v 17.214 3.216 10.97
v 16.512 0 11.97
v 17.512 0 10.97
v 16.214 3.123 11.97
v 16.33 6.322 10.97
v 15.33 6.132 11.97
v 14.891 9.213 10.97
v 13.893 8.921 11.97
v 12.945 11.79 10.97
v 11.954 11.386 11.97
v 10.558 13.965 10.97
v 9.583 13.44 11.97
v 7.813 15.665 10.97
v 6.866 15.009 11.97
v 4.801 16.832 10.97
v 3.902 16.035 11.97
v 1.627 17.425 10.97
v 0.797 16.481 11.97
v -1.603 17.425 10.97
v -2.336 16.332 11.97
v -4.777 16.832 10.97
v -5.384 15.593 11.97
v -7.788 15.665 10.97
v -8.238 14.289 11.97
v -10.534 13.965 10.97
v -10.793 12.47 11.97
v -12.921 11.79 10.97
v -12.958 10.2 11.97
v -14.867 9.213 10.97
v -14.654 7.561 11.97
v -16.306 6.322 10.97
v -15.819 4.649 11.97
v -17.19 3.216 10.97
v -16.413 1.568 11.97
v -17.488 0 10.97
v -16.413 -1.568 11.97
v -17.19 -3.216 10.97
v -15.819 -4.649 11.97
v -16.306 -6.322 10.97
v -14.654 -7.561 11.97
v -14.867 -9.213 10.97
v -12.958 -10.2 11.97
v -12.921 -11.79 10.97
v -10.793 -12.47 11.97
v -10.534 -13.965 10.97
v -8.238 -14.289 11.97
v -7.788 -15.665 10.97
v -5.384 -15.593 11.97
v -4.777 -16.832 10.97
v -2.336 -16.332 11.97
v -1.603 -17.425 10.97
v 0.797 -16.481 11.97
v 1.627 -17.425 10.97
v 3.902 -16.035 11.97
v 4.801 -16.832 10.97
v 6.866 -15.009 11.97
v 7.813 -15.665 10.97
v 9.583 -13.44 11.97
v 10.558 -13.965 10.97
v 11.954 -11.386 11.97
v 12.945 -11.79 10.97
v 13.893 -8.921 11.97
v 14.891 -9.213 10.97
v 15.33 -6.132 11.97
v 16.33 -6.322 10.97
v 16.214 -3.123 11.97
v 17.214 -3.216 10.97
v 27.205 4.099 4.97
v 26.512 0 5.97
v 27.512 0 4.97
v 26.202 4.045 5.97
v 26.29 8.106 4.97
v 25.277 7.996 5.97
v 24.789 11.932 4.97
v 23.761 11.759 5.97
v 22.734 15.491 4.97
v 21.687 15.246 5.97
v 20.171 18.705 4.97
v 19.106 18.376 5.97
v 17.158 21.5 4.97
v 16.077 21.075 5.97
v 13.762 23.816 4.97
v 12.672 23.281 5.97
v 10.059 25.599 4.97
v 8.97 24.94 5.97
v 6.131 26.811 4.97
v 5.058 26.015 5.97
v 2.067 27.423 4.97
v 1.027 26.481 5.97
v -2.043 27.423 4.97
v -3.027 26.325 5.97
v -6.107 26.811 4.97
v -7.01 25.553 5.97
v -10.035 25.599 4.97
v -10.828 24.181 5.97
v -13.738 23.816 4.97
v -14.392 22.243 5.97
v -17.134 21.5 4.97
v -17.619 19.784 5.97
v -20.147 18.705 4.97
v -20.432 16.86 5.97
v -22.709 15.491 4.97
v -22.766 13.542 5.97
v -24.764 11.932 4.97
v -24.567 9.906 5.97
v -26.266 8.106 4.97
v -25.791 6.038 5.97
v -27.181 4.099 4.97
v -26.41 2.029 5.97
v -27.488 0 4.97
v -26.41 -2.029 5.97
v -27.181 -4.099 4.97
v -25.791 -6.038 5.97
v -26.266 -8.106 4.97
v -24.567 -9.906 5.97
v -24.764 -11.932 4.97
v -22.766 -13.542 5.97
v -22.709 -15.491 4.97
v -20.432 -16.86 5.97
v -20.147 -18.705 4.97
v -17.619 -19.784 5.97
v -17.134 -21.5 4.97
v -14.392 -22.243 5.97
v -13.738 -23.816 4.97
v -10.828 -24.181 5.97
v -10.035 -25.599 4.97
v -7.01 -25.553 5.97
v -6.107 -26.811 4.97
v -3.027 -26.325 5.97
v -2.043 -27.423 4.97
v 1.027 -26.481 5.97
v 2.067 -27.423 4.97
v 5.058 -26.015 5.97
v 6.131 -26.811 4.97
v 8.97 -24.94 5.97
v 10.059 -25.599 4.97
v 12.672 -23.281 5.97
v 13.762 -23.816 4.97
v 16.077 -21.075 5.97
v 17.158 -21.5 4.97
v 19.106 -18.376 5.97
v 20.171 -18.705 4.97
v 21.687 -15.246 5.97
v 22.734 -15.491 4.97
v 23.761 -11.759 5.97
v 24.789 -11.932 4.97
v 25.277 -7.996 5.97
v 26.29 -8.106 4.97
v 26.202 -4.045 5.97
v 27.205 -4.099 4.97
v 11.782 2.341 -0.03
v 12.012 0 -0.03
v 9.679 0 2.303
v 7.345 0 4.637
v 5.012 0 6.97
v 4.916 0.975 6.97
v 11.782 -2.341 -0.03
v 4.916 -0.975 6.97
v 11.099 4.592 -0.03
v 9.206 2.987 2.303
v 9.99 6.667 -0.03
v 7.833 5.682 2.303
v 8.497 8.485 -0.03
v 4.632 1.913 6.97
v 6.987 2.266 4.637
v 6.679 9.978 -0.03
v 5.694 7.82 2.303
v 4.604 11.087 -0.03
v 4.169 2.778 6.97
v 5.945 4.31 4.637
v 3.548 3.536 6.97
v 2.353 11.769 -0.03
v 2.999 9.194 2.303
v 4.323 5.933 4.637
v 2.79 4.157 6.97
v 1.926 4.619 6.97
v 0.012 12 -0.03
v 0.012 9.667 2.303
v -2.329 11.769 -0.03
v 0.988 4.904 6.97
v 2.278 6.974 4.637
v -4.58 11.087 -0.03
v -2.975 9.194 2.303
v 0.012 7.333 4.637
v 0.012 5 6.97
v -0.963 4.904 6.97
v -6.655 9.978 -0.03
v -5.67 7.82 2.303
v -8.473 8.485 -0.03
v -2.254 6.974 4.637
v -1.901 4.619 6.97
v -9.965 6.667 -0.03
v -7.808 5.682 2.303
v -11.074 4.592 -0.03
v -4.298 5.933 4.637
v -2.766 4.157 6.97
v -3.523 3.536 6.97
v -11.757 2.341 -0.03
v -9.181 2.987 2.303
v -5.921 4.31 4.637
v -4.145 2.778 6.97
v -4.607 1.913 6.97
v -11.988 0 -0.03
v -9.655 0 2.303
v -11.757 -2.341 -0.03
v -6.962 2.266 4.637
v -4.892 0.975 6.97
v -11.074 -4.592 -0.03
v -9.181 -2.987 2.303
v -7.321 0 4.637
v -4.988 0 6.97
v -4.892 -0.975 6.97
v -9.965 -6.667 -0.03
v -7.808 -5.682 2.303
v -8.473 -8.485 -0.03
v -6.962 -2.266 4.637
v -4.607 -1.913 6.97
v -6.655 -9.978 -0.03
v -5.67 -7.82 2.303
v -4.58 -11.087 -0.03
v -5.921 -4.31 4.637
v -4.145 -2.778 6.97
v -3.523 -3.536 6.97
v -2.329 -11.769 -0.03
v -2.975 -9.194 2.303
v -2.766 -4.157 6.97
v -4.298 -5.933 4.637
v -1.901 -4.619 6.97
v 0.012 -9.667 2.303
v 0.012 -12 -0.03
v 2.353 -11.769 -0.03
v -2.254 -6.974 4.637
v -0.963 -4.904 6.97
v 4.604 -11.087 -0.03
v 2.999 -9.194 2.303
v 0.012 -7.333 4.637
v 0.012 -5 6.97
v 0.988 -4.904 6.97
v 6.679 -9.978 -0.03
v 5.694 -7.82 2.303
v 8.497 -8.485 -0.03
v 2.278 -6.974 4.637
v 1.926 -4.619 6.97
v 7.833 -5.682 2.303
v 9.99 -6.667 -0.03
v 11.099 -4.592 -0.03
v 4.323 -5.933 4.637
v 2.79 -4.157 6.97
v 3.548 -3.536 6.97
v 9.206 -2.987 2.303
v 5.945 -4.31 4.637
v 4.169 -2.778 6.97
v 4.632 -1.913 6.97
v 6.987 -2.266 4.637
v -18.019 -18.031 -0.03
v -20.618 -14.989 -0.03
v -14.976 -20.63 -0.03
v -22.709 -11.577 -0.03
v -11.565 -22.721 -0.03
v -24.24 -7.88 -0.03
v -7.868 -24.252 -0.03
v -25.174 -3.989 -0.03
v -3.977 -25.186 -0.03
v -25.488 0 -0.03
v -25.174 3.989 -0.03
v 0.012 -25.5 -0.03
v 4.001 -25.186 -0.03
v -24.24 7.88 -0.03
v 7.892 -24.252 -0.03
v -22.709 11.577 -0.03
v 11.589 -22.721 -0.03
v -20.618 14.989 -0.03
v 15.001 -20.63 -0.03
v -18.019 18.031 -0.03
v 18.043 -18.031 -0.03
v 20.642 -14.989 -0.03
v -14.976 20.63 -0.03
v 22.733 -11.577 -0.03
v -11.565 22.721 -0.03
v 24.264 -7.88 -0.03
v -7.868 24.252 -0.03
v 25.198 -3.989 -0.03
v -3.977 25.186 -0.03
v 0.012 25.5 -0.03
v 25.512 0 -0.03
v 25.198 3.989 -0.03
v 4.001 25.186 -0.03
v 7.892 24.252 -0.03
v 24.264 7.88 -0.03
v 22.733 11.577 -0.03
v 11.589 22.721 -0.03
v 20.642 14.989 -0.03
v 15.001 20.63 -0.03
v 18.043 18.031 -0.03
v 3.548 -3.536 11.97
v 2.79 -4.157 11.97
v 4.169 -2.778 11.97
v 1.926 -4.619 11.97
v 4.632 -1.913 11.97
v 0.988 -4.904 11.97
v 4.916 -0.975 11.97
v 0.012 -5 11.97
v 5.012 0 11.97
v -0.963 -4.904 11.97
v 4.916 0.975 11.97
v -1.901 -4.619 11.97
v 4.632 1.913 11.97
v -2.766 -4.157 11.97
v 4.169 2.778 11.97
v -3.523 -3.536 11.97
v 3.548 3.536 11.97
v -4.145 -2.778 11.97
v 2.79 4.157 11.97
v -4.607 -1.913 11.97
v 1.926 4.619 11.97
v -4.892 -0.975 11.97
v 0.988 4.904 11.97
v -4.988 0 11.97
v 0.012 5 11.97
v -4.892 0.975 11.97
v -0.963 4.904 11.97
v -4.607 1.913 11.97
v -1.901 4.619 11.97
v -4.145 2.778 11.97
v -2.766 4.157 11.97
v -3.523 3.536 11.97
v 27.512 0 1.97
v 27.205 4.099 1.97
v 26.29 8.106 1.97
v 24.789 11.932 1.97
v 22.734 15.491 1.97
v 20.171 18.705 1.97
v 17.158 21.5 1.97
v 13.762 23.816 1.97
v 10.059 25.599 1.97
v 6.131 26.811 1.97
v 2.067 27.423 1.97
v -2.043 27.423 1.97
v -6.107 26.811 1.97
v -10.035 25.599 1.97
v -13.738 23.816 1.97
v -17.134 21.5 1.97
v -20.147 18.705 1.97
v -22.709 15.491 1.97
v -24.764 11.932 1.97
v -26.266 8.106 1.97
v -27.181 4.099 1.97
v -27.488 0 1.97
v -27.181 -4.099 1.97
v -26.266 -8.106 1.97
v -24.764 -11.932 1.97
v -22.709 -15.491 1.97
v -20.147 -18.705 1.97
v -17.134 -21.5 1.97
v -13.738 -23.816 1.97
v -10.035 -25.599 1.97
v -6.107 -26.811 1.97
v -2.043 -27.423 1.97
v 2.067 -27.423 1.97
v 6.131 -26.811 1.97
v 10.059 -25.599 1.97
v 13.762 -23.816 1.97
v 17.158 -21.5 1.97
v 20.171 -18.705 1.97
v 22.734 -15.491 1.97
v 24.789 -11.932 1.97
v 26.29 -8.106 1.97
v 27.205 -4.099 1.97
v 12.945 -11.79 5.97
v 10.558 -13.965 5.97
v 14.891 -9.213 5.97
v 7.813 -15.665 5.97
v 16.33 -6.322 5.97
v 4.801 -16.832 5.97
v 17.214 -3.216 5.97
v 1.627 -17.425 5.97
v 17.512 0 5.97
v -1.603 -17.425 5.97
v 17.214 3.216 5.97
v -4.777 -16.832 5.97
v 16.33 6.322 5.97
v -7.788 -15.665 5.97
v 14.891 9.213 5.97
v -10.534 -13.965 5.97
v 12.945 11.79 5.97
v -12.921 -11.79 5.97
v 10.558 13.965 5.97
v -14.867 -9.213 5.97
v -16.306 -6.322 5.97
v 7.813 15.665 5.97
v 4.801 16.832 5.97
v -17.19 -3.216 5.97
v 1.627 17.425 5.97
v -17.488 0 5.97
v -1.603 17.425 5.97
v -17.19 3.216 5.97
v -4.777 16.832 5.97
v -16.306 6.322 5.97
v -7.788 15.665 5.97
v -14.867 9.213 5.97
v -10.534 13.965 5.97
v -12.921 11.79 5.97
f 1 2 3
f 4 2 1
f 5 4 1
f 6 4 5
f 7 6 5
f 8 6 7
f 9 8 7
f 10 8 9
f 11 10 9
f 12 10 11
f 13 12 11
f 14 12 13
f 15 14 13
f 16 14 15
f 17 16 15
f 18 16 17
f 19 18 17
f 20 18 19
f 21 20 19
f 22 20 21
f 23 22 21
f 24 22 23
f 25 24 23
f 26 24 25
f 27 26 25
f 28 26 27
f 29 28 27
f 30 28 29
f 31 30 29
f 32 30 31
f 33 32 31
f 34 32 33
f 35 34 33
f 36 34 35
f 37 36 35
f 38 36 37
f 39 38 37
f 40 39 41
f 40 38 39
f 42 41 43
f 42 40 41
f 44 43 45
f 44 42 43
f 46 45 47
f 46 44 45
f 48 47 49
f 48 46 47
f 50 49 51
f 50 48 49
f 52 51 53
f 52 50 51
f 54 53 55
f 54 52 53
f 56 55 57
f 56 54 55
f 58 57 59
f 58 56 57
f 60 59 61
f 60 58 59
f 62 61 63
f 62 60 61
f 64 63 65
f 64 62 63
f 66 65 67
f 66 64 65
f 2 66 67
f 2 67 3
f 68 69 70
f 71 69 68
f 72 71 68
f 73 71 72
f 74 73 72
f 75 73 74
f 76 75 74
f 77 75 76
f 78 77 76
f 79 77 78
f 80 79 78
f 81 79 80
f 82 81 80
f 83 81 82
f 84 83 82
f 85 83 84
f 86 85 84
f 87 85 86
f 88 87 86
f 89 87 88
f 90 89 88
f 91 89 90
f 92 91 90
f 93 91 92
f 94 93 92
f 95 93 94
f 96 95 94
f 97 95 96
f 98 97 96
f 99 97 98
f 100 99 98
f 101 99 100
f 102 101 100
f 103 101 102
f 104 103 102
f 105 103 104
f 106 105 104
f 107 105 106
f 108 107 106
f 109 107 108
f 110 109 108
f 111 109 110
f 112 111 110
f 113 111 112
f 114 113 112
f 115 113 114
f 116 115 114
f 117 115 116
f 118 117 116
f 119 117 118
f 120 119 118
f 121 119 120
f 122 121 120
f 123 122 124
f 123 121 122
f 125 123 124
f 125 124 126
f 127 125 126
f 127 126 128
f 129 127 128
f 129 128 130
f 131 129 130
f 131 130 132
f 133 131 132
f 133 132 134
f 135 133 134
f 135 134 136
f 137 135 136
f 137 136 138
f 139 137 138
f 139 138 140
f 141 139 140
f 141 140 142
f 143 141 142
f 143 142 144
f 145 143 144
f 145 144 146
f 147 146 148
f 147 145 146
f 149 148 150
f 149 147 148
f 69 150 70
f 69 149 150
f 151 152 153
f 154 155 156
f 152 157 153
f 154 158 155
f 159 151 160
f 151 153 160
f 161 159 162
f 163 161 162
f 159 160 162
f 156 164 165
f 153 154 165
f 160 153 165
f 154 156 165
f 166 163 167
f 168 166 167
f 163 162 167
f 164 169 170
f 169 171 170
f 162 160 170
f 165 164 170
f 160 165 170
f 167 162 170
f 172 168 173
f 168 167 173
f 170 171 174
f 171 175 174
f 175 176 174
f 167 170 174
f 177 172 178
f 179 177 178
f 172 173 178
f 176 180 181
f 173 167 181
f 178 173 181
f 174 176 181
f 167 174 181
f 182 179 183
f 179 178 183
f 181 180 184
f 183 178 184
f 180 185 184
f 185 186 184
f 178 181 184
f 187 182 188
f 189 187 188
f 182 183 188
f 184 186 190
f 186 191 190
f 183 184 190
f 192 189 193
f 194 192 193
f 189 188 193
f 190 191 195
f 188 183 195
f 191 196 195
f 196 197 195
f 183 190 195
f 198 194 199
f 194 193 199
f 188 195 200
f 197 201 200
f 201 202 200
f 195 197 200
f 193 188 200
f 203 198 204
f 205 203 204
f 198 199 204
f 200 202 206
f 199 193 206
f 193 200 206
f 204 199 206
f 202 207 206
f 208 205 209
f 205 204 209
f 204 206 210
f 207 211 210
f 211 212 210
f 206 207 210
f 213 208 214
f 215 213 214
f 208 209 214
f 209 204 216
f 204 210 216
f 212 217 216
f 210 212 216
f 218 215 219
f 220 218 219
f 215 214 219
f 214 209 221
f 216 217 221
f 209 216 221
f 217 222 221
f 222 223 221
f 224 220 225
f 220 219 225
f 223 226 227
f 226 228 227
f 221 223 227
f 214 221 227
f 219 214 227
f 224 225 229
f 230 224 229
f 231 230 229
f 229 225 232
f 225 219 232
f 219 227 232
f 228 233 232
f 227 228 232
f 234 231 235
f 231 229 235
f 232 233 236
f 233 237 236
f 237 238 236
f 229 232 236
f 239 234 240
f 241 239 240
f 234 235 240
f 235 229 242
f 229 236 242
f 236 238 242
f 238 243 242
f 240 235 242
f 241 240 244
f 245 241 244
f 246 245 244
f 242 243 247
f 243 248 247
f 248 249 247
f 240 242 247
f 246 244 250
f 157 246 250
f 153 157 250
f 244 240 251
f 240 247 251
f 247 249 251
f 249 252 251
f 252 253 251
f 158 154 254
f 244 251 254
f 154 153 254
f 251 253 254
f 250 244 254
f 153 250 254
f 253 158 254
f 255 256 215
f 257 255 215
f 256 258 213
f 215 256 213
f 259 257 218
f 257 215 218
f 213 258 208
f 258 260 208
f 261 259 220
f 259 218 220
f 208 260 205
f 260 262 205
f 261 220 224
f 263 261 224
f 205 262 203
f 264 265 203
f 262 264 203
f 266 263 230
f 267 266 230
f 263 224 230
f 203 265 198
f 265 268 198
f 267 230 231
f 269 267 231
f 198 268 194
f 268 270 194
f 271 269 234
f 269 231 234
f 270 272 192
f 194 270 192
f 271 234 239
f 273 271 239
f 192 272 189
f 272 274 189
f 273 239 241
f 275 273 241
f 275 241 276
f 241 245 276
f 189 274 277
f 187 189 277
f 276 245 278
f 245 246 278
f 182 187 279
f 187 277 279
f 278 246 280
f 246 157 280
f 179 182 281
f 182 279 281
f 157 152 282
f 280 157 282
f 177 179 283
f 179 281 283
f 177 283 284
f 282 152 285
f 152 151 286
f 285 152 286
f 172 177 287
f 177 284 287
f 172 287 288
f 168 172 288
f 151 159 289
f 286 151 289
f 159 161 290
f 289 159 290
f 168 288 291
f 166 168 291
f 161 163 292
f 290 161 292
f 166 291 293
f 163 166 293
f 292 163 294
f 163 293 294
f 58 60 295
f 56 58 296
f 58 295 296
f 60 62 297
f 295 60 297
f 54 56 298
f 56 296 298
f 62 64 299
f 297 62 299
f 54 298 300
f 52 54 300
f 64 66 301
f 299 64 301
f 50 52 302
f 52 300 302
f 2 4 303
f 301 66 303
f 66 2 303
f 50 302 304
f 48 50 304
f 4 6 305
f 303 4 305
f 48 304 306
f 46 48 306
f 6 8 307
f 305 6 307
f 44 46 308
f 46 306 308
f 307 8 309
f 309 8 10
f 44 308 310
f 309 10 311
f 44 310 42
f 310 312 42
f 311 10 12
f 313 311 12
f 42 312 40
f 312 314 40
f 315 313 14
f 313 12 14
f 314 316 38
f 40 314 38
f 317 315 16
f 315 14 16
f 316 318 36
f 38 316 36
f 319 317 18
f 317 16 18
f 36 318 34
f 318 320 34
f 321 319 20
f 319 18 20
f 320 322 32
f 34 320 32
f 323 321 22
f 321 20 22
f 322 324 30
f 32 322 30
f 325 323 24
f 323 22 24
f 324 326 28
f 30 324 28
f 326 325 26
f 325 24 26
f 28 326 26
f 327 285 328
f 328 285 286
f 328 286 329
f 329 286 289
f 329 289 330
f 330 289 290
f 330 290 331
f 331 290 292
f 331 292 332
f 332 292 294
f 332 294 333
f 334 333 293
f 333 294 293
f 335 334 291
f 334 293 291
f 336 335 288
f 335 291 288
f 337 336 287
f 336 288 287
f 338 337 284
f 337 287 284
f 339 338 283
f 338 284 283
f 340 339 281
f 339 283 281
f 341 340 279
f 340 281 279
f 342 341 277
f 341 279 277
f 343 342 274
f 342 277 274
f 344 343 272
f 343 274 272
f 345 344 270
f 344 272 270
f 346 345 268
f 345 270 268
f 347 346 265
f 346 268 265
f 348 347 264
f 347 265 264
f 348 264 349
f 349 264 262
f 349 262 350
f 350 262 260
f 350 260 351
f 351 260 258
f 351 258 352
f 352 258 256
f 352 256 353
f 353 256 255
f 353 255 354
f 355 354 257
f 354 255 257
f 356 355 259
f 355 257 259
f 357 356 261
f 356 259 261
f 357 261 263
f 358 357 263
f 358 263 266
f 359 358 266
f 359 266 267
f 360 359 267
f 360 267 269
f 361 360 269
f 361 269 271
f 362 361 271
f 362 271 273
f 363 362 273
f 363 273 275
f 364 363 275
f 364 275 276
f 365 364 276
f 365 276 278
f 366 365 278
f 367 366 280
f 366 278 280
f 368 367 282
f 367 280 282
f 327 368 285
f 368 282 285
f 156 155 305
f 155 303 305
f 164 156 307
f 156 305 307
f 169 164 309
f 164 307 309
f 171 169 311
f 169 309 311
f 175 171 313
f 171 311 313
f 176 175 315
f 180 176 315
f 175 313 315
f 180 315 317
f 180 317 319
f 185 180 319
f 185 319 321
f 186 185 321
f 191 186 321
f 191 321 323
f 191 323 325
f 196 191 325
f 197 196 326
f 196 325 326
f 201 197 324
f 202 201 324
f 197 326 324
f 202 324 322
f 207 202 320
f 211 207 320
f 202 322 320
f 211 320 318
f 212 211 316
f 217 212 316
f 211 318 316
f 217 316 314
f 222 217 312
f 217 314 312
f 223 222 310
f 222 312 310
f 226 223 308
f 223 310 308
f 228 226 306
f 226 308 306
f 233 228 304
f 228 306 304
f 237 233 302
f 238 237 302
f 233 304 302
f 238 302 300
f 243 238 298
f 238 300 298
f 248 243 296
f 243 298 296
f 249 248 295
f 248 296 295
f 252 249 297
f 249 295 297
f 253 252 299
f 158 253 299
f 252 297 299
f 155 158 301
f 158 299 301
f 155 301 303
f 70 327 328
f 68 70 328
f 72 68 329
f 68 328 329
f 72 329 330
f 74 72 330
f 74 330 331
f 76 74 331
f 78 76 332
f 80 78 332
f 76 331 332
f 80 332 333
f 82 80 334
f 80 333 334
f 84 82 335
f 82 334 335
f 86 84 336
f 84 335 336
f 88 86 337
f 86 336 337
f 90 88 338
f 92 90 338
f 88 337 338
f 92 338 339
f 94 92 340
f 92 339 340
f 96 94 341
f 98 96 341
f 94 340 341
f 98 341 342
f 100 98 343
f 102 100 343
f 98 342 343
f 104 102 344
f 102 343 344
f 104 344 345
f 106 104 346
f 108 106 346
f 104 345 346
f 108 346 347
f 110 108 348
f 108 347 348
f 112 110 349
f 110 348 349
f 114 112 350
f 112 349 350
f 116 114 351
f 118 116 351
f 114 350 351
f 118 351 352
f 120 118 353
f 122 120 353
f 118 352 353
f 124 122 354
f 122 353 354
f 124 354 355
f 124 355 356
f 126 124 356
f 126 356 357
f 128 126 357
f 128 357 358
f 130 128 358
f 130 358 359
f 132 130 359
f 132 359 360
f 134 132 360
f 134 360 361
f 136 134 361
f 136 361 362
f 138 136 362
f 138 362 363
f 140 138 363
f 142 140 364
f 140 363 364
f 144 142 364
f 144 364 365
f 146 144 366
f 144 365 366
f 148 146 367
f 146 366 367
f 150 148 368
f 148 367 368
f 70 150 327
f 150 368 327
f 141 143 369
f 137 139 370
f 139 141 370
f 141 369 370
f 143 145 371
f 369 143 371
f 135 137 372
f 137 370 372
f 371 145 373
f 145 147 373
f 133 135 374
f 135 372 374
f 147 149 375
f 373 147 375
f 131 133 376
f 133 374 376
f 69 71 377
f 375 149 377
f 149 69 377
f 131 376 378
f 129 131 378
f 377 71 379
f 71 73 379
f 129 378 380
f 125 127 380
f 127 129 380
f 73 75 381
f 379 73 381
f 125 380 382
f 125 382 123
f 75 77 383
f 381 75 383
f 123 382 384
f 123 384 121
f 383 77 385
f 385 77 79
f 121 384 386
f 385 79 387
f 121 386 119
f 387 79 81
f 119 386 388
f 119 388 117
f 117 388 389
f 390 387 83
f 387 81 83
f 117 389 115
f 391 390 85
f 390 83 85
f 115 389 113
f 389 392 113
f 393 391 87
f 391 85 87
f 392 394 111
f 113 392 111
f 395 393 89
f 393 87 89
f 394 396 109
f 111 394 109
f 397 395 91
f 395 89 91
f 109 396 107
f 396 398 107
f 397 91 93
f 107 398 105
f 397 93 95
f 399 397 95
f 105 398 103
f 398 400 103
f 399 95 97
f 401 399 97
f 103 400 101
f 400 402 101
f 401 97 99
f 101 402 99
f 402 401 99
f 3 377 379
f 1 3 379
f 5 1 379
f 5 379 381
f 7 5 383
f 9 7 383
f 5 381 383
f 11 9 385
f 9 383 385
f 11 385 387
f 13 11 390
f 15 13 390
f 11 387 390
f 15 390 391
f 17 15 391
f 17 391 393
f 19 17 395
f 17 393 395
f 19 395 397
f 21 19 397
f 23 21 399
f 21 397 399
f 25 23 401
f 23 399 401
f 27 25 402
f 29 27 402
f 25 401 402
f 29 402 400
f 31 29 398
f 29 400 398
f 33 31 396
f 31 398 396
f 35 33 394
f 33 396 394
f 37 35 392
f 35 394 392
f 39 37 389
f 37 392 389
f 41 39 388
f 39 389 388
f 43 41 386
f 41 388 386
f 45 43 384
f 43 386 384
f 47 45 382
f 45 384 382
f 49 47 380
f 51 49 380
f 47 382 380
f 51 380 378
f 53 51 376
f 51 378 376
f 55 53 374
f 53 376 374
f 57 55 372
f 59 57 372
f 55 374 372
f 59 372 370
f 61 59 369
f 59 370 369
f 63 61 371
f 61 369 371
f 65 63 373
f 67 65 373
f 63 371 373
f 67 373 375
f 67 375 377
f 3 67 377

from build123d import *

# Parameters (mm, degrees)
CHAFL_N1_SIZE = 2
CHAFL_N2_SIZE = 1


with BuildPart() as part:
    # Croquis1 → Revolución1 (revolve)
    with BuildSketch(Plane(origin=(0, 0, 0), x_dir=(1, 0, 0), z_dir=(0, 1, 0))):
        Polygon((17.512143261, -5.969981855), (27.512147725, -5.969981855), (27.512147725, 0.030018145), (12.012147715, 0.030018145), (5.012147715, -6.969981855), (5.012147715, -11.969981855), (17.512143261, -11.969981855), align=None)
    revolve(axis=Axis((0.012147715, 0, 0), (0, 0, 1)))

    # Chaflán1
    chafl_n1_edges = [part.edges().sort_by_distance(p)[0] for p in [
        (-27.487852294, 0, -0.030018145),
    ]]
    chamfer(chafl_n1_edges, length=CHAFL_N1_SIZE)

    # Chaflán2
    chafl_n2_edges = [part.edges().sort_by_distance(p)[0] for p in [
        (-27.487852294, 0, 5.969981855),
        (-17.48784783, 0, 11.969981855),
    ]]
    chamfer(chafl_n2_edges, length=CHAFL_N2_SIZE)


solid = part.part
